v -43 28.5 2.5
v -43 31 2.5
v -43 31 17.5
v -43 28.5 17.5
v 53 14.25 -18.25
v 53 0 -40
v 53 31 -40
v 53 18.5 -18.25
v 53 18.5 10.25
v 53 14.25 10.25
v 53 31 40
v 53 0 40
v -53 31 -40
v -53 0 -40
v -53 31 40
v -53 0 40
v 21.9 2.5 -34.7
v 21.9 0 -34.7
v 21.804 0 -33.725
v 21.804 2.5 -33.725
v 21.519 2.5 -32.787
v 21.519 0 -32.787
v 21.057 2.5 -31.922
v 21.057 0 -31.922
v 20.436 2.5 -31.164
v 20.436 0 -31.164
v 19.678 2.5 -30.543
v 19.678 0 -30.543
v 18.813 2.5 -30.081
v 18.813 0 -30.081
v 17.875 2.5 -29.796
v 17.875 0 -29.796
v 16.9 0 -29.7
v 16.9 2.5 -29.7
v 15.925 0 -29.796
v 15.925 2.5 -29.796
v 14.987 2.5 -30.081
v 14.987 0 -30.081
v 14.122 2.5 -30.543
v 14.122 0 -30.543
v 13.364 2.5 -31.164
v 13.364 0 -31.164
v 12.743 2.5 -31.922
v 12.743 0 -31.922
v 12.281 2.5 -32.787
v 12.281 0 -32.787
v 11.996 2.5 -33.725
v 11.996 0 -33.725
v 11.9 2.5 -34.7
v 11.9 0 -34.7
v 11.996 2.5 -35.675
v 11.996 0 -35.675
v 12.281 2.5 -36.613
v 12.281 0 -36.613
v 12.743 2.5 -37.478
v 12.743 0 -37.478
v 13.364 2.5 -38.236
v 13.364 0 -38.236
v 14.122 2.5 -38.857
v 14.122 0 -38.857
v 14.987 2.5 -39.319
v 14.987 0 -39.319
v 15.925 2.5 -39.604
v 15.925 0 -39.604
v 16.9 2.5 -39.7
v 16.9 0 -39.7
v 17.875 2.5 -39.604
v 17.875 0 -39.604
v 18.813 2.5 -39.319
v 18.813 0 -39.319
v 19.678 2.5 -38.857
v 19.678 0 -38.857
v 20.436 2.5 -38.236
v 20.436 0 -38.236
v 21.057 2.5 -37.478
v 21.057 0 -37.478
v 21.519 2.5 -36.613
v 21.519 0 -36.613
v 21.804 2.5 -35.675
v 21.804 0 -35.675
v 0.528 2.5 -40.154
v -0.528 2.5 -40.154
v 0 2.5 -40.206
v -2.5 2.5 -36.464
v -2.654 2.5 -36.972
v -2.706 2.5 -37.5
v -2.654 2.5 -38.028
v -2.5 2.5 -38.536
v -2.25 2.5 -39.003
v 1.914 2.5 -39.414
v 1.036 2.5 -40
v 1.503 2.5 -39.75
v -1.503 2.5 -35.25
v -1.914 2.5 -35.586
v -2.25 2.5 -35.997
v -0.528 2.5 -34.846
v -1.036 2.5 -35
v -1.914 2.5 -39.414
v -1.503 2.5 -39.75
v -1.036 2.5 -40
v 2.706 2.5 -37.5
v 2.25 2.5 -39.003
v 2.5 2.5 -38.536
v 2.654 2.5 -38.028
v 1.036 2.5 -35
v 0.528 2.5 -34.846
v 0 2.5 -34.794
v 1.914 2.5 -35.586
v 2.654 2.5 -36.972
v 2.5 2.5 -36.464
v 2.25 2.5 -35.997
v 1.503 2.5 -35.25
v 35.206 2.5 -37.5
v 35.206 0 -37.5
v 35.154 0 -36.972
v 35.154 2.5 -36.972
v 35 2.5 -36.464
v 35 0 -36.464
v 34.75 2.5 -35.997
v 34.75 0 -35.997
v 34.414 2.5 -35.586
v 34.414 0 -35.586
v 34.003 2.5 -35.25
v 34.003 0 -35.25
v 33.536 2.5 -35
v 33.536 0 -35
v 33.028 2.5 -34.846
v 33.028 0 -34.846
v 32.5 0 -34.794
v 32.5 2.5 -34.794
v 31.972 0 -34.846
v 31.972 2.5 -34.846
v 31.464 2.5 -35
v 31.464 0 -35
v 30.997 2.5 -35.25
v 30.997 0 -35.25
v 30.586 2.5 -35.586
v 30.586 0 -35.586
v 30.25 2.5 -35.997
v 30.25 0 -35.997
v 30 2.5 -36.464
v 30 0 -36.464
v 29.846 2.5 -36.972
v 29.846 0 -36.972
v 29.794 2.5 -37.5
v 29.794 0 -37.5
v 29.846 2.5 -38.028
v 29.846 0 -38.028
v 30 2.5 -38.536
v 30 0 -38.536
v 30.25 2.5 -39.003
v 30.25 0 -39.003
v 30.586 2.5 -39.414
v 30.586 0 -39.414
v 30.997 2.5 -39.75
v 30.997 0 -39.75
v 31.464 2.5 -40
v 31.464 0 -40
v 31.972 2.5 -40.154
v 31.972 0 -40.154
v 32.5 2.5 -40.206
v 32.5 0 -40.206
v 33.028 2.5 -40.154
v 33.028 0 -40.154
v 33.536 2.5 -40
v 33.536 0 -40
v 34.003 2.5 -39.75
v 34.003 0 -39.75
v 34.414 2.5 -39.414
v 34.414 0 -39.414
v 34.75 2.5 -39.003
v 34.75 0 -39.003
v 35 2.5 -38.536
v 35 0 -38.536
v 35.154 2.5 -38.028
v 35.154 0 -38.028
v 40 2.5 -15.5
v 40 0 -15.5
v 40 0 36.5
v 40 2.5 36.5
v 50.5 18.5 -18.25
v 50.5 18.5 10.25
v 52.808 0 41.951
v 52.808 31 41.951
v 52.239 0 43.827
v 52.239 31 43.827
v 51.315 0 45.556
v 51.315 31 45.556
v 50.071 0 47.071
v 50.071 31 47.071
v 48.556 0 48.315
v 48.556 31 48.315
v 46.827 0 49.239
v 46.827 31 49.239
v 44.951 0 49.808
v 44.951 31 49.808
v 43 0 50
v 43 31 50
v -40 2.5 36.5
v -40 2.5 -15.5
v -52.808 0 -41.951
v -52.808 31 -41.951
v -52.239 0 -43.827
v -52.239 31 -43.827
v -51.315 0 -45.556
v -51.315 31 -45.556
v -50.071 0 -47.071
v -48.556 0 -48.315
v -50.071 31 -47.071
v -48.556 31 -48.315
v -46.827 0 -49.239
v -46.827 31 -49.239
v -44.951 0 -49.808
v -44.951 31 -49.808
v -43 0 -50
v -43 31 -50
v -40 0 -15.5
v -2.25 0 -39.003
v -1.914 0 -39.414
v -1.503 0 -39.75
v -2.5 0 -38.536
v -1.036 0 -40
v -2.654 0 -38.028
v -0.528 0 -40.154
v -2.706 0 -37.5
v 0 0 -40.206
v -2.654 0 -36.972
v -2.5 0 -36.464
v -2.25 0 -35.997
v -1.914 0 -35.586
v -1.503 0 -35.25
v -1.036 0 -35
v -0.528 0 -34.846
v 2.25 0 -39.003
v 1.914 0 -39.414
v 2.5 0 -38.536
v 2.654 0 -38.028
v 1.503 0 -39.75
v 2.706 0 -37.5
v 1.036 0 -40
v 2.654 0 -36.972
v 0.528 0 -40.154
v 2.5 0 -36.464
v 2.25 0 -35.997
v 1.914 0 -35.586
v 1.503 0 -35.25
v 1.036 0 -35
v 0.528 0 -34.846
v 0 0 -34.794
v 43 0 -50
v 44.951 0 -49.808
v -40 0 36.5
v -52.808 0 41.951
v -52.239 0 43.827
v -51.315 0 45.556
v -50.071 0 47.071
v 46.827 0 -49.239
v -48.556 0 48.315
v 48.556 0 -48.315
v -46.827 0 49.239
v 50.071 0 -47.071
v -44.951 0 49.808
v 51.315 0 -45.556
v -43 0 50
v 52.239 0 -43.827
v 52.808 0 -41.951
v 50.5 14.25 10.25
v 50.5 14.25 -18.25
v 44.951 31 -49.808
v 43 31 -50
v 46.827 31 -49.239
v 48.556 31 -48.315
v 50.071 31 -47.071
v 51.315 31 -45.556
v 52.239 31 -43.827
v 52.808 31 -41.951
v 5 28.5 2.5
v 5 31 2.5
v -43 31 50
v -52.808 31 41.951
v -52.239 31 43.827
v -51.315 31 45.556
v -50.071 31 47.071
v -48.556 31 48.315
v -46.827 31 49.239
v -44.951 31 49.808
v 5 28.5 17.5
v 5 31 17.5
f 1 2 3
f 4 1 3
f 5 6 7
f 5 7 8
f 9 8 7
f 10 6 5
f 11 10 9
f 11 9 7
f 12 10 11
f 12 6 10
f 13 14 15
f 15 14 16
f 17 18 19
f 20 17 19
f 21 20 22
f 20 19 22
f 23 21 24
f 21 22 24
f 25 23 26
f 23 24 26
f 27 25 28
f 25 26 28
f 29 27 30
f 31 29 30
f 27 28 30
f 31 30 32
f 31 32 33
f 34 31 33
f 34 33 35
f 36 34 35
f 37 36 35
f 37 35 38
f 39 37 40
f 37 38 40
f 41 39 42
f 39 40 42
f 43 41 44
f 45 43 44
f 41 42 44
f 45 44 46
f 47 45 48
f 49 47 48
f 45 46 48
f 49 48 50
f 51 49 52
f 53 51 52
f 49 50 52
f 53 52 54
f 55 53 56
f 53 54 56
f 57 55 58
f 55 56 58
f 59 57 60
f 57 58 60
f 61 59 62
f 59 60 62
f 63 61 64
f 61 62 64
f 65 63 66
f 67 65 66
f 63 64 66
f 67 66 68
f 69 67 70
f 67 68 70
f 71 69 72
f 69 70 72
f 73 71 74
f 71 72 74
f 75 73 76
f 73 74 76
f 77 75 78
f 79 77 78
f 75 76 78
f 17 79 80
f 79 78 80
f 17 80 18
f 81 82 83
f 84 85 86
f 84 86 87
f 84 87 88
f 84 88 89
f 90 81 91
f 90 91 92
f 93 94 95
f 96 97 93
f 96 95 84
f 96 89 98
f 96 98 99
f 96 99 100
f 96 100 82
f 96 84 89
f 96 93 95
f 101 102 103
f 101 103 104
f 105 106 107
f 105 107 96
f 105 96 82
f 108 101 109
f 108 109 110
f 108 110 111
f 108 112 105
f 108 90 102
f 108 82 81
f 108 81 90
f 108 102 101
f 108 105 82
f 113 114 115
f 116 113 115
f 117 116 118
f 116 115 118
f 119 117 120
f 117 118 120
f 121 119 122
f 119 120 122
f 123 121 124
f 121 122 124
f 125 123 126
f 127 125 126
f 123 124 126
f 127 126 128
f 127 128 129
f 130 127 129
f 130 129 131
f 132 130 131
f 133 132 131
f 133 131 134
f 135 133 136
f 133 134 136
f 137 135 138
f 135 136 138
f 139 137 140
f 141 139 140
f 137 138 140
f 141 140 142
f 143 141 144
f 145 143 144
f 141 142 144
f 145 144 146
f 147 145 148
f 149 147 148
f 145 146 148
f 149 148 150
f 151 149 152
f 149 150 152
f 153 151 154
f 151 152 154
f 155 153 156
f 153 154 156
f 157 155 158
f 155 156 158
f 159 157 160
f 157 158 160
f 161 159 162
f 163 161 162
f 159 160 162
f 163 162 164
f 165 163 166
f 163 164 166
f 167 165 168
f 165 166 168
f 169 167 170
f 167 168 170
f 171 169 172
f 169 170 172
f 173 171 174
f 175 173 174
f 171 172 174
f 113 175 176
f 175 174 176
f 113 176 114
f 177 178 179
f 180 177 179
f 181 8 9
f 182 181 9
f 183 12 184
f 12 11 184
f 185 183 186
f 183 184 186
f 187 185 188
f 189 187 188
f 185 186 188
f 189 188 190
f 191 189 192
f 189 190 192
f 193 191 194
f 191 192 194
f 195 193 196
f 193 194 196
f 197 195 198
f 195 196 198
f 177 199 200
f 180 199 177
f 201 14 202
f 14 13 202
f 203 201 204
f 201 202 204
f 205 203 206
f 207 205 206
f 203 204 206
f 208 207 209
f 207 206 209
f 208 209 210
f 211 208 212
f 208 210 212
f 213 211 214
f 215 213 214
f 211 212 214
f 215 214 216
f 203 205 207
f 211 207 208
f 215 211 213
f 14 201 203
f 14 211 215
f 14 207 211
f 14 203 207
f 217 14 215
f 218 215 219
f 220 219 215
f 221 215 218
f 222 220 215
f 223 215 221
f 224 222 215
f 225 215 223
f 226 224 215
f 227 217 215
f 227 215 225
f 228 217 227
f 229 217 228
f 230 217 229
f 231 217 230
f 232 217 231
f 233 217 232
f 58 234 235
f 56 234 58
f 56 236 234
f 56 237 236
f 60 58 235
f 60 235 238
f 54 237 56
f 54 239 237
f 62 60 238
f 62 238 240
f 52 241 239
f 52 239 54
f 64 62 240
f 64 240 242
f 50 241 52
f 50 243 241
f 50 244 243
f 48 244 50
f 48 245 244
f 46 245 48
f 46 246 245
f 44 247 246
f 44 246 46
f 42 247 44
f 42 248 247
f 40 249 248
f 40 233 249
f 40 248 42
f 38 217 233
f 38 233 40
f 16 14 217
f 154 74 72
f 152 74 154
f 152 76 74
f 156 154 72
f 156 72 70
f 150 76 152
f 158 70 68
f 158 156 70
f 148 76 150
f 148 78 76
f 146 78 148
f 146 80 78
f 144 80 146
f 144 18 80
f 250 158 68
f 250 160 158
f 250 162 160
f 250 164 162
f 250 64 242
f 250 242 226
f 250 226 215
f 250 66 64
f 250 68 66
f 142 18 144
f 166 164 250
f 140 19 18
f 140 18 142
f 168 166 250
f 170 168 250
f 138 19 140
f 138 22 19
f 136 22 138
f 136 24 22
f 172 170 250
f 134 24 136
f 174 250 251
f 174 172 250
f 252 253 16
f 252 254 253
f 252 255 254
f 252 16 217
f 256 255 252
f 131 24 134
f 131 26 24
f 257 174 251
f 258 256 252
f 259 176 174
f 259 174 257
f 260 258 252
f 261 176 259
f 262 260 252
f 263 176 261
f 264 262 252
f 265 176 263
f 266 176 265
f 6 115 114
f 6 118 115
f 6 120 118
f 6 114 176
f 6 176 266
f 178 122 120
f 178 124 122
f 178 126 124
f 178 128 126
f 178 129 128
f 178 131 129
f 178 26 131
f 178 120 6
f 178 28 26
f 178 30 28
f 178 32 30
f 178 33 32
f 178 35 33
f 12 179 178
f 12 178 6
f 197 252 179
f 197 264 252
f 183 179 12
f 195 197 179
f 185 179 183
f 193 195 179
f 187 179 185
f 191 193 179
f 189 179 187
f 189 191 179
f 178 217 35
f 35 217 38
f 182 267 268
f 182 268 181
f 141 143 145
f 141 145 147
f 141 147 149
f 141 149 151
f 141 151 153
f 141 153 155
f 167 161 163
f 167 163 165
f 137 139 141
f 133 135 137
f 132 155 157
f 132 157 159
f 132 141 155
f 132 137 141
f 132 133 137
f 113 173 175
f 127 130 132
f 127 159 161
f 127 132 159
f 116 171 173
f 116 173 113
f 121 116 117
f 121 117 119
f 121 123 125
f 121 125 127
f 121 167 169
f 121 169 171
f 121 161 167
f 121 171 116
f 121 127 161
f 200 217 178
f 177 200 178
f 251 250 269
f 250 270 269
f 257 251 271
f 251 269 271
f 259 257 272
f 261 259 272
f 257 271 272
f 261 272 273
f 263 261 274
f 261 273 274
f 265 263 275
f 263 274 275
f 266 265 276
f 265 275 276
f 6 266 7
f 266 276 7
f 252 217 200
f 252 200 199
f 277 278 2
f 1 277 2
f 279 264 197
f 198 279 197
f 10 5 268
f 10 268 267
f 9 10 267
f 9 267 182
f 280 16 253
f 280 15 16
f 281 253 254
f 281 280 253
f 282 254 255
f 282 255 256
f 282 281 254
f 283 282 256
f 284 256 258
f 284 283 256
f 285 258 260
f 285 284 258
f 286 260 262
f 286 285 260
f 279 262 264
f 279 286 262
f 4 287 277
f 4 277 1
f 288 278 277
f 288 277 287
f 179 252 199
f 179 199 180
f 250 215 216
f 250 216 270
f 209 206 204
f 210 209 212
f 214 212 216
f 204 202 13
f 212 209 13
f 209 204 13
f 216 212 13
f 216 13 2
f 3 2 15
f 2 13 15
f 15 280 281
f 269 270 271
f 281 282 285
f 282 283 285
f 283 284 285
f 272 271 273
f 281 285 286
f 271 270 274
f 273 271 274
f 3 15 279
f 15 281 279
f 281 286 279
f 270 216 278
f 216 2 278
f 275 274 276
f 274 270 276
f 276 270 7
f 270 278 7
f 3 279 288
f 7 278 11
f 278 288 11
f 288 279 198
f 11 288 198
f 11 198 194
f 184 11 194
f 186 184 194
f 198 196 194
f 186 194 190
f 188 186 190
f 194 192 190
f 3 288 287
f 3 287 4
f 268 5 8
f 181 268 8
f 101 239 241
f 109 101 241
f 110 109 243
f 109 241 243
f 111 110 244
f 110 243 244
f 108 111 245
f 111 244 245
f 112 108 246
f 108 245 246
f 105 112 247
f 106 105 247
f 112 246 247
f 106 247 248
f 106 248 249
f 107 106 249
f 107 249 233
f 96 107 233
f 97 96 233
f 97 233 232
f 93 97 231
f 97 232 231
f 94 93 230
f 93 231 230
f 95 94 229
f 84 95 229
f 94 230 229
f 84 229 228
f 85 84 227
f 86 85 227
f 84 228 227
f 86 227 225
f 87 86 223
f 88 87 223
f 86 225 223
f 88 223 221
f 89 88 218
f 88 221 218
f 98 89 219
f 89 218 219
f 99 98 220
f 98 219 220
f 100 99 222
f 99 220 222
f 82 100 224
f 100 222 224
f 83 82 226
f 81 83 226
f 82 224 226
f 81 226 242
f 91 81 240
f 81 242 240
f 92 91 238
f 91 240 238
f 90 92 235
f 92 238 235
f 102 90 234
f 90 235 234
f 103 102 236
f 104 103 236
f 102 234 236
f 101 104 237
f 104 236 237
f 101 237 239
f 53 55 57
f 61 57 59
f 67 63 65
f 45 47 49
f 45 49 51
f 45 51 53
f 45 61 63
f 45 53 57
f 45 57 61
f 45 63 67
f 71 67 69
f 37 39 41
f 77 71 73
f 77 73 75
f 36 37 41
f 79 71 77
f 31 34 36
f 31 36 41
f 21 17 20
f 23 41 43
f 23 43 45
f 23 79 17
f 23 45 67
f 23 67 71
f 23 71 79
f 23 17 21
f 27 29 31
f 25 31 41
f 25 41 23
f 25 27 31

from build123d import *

# Parameters (mm, degrees)
F0_W     = 106
F0_H     = 100
F0_R     = 2.706104
F0_R_2   = 5
F0_W_2   = 80
F0_H_2   = 52
F1_DEPTH = 31
F2_R     = 10
F3_DEPTH = 2.5
F4_W     = 48
F4_H     = 15
F5_DEPTH = 2.5
F6_W     = 4.25
F6_H     = 28.5
F7_DEPTH = 2.5


with BuildPart() as f1:
    # F0 (on Front) → F1 (new body)
    with BuildSketch(Plane.XZ):
        Rectangle(F0_W, F0_H)
        with Locations((0, -37.5)):
            Circle(F0_R, mode=Mode.SUBTRACT)
        with Locations((16.9, -34.7)):
            Circle(F0_R_2, mode=Mode.SUBTRACT)
        with Locations((32.5, -37.5)):
            Circle(F0_R, mode=Mode.SUBTRACT)
        with Locations((0, 10.5)):
            Rectangle(F0_W_2, F0_H_2, mode=Mode.SUBTRACT)
        with Locations((0, 10.5)):
            Rectangle(F0_W_2, F0_H_2)
        with Locations((0, -37.5)):
            Circle(F0_R)
        with Locations((16.9, -34.7)):
            Circle(F0_R_2)
        with Locations((32.5, -37.5)):
            Circle(F0_R)
    extrude(amount=-F1_DEPTH)

    # F2
    f2_edges = [f1.edges().sort_by_distance(p)[0] for p in [
        (53, 15.5, -50),
        (53, 15.5, 50),
        (-53, 15.5, 50),
        (-53, 15.5, -50),
    ]]
    fillet(f2_edges, radius=F2_R)

    # F0 (on Front) → F3 (cut)
    with BuildSketch(Plane.XZ):
        with Locations((0, 10.5)):
            Rectangle(F0_W_2, F0_H_2)
        with Locations((0, -37.5)):
            Circle(F0_R)
        with Locations((16.9, -34.7)):
            Circle(F0_R_2)
        with Locations((32.5, -37.5)):
            Circle(F0_R)
    extrude(amount=-F3_DEPTH, mode=Mode.SUBTRACT)

    # F4 (on face) → F5 (cut)
    with BuildSketch(Plane(origin=(0, 31, 0), x_dir=(-1, 0, 0), z_dir=(0, 1, 0))):
        with Locations((19, 10)):
            Rectangle(F4_W, F4_H)
    extrude(amount=-F5_DEPTH, mode=Mode.SUBTRACT)

    # F6 (on face) → F7 (cut)
    with BuildSketch(Plane.YZ.offset(53)):
        with Locations((16.375, -4)):
            Rectangle(F6_W, F6_H)
    extrude(amount=-F7_DEPTH, mode=Mode.SUBTRACT)


solid = f1.part
